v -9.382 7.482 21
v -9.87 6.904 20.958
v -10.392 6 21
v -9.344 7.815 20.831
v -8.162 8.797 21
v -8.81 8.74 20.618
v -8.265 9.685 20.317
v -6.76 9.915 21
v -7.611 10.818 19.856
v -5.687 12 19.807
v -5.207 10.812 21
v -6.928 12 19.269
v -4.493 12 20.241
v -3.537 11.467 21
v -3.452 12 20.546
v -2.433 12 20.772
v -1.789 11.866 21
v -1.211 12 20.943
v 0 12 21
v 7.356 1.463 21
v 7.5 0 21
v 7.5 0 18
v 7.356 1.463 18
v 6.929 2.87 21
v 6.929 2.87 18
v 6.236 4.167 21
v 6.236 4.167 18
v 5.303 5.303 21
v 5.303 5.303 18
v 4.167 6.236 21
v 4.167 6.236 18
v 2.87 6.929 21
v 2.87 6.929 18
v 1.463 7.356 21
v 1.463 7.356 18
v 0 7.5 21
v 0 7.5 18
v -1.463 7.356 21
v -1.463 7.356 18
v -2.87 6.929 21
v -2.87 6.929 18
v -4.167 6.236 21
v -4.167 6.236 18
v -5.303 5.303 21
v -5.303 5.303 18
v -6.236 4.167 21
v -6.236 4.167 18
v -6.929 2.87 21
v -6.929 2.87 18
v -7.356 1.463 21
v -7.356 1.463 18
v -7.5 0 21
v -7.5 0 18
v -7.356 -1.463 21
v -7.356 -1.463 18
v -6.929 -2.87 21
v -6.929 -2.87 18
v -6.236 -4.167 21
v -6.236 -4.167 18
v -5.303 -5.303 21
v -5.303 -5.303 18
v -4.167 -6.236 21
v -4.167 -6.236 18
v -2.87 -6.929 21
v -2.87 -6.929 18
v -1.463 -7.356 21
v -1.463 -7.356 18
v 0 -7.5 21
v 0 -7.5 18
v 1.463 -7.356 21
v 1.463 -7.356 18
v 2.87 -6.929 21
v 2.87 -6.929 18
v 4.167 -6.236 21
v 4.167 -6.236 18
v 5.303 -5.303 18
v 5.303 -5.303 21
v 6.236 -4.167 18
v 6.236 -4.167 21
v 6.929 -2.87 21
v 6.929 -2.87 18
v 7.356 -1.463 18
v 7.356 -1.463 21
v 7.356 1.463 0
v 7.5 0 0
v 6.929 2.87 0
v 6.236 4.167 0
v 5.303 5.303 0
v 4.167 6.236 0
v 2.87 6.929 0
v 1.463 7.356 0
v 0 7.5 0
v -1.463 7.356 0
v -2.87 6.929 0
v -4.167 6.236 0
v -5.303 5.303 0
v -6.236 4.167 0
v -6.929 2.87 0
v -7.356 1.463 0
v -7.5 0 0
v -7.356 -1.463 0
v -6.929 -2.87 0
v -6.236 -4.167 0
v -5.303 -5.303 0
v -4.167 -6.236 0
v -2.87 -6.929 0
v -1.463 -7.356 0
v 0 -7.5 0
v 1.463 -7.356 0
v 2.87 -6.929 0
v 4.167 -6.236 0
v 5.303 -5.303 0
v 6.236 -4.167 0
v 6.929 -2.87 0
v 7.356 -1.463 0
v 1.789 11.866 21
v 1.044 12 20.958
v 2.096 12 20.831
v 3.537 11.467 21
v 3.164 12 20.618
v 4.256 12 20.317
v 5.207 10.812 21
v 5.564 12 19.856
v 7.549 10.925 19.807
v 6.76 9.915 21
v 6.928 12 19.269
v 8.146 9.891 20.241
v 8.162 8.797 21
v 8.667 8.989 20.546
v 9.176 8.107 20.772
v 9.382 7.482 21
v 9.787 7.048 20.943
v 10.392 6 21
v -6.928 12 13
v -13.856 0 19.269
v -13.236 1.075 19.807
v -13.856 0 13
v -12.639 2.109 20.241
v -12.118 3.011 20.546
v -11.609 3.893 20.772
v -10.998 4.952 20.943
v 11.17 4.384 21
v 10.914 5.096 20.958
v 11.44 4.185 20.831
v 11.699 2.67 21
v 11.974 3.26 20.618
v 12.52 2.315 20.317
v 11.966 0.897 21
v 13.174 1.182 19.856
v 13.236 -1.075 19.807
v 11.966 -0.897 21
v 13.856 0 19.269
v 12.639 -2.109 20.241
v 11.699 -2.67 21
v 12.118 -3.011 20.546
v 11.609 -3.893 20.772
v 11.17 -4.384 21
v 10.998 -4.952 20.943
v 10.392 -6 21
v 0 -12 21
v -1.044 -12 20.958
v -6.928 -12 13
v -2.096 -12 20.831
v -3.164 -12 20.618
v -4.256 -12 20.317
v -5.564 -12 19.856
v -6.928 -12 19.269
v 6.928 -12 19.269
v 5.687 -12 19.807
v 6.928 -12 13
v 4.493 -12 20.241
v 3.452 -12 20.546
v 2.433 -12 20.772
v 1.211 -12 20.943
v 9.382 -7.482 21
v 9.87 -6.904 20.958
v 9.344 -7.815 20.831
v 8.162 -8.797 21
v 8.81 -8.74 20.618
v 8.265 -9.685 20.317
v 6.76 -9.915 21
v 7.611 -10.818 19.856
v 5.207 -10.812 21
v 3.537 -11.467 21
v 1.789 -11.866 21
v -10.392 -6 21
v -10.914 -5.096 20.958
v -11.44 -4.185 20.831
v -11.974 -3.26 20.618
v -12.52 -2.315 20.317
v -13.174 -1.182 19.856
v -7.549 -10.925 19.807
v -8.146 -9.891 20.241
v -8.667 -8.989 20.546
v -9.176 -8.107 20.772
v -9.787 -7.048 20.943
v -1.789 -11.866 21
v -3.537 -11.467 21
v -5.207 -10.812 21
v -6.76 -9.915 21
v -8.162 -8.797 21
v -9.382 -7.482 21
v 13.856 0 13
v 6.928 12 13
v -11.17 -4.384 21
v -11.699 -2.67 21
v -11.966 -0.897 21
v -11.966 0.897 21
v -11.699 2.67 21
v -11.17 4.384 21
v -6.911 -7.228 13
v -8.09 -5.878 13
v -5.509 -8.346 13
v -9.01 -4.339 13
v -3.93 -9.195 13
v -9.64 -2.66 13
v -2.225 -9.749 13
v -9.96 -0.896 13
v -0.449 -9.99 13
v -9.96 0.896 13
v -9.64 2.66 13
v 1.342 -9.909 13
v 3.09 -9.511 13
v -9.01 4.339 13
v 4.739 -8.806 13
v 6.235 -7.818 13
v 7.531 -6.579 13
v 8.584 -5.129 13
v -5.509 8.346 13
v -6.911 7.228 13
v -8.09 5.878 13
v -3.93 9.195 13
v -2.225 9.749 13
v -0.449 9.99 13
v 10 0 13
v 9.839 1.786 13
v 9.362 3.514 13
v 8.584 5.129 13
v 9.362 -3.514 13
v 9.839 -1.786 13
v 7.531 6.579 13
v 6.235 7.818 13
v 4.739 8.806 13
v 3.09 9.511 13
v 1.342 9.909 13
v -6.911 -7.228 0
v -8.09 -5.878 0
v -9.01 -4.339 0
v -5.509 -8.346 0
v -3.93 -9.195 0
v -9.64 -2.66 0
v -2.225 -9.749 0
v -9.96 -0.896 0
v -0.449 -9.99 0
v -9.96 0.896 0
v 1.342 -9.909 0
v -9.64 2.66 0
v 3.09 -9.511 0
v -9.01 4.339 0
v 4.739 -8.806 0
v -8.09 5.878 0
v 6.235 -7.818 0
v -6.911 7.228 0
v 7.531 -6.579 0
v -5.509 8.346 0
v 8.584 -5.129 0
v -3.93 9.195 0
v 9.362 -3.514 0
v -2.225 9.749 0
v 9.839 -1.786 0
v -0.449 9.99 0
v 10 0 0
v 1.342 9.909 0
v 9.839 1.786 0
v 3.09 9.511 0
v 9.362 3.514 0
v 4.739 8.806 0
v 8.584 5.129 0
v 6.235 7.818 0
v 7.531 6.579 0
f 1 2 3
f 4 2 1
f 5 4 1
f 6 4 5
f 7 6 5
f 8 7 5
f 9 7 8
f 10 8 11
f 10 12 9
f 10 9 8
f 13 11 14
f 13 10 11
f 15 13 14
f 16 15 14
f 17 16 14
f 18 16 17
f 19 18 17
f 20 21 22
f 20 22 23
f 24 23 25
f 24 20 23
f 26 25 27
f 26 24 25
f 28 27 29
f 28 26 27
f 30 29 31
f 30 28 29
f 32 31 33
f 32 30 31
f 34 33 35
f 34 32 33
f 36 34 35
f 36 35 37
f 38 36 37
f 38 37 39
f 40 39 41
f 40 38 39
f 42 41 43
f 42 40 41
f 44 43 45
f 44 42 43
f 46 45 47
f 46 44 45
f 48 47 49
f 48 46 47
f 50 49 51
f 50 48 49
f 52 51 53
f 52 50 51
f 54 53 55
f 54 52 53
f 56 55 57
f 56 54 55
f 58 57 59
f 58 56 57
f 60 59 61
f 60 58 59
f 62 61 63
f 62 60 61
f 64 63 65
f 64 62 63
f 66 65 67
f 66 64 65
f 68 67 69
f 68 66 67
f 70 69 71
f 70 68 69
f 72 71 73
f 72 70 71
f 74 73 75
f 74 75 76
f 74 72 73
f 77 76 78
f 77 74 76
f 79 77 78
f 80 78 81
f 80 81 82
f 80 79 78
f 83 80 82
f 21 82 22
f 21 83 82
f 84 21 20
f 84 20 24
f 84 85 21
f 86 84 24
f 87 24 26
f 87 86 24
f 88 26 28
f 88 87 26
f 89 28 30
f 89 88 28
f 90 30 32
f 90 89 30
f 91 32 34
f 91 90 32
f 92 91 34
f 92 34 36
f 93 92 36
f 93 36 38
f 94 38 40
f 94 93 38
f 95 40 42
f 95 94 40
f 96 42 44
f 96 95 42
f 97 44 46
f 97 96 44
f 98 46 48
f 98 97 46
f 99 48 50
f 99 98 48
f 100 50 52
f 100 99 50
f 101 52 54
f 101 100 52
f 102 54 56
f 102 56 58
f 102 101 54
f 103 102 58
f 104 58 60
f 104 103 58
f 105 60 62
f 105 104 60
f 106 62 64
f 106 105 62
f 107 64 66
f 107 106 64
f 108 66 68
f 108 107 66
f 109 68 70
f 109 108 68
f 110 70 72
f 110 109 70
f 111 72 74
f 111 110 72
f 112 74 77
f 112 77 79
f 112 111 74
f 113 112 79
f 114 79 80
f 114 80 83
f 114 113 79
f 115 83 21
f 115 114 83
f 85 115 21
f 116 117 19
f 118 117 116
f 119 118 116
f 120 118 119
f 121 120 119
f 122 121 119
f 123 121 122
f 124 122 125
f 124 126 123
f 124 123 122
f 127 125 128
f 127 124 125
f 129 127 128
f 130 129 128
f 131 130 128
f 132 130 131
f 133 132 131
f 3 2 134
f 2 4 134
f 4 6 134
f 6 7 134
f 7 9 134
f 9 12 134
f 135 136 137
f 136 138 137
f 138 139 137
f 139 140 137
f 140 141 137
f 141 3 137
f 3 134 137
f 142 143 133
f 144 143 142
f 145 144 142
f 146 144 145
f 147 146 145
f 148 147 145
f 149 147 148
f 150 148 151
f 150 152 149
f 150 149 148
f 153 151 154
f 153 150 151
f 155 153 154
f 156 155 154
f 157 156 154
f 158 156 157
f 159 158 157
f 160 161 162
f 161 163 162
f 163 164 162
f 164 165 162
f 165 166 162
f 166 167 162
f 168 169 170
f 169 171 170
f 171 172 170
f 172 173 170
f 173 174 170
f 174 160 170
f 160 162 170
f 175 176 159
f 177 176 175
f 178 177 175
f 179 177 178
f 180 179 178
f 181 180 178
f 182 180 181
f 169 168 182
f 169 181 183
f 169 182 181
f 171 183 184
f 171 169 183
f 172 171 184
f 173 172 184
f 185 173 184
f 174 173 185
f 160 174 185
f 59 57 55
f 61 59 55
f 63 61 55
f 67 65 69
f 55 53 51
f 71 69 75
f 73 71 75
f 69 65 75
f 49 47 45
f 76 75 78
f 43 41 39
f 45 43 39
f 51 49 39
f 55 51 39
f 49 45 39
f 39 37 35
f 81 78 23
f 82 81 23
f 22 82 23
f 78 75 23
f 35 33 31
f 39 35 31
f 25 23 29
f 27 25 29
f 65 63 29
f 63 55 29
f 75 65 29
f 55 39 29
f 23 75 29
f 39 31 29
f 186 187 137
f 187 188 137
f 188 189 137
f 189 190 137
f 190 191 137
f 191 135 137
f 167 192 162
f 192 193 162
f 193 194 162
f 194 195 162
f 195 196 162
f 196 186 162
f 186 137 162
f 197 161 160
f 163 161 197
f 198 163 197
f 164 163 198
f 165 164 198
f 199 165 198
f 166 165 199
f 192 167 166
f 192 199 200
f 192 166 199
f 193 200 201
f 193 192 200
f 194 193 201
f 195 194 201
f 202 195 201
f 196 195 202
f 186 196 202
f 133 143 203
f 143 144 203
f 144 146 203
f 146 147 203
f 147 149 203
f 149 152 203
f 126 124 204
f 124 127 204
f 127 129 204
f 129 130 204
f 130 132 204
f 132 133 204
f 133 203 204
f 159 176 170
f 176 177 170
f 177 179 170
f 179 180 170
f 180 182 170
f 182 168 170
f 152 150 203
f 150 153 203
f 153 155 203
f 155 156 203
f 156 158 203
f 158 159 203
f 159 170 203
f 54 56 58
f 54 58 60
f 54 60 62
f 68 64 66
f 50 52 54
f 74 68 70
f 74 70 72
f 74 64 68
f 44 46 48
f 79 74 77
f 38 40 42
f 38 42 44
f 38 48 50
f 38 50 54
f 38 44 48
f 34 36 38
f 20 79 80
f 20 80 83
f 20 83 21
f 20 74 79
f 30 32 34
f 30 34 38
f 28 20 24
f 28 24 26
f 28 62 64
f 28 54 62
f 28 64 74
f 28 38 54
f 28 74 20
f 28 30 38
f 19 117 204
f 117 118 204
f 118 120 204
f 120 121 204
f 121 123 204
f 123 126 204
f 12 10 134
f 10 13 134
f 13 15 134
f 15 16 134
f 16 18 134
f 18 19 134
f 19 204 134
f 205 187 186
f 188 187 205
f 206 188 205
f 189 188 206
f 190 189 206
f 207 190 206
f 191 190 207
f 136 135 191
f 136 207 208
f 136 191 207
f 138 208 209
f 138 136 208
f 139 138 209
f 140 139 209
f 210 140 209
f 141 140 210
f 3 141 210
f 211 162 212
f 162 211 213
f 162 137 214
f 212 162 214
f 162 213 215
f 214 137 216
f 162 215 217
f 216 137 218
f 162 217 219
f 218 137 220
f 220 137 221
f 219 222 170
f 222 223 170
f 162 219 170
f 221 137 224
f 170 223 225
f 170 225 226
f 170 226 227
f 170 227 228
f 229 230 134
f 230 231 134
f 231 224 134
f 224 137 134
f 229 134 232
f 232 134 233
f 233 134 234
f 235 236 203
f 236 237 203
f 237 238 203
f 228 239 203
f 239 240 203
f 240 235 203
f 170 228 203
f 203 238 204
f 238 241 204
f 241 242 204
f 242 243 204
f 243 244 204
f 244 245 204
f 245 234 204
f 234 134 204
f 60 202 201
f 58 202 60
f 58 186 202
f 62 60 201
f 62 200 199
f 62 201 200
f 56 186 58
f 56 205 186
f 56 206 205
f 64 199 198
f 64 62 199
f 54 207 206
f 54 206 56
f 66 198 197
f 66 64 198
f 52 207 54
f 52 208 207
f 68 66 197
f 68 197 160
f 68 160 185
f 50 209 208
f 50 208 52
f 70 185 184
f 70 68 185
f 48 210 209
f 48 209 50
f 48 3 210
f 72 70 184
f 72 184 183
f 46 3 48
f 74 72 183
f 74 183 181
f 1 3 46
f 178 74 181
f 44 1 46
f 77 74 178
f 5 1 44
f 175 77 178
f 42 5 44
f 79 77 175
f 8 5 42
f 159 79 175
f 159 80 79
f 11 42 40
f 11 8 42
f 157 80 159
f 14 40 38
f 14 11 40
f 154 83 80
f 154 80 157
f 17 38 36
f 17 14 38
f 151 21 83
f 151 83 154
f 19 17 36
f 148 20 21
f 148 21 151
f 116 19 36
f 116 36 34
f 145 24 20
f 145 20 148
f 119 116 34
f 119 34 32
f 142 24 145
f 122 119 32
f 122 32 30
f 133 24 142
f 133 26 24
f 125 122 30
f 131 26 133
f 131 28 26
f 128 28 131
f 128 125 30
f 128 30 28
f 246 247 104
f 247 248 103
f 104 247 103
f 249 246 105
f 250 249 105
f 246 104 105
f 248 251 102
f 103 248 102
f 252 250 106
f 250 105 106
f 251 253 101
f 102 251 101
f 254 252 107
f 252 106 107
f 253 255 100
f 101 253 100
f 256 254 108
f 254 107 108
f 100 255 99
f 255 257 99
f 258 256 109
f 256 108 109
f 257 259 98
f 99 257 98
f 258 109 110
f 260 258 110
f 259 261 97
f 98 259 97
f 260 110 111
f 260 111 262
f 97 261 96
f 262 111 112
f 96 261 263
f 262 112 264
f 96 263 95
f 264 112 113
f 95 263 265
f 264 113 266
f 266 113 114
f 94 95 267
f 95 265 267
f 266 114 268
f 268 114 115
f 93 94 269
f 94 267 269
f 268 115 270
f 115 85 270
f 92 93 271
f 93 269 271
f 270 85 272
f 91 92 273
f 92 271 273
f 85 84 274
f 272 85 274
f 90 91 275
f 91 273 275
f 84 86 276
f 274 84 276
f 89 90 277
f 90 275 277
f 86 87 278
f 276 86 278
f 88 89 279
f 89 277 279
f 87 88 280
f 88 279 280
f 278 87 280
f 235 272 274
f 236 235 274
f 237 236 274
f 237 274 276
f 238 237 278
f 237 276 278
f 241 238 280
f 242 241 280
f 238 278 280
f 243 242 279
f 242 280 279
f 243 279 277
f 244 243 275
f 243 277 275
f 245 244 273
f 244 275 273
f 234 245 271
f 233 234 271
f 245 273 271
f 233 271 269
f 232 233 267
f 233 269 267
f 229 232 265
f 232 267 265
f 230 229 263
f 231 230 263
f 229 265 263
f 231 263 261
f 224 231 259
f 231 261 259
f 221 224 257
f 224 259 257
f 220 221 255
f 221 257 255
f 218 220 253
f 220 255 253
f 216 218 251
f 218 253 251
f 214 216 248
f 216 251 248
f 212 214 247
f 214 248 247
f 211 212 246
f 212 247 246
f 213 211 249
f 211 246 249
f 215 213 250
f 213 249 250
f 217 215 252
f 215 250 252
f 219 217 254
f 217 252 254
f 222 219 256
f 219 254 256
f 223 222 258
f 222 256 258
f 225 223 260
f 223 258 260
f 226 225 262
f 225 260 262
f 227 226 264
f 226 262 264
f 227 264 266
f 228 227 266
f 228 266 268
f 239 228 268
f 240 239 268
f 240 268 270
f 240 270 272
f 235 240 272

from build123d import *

# Parameters (mm, degrees)
SCHIZZO1_R                   = 10
SCHIZZO1_R_2                 = 7.5
ESTRUSIONE_ESTRUSIONE1_DEPTH = 13
SCHIZZO2_R                   = 7.5
ESTRUSIONE_ESTRUSIONE2_DEPTH = 8
SCHIZZO3_OUTSIDE_W           = 42.452
SCHIZZO3_OUTSIDE_H           = 38.74
SCHIZZO3_OUTSIDE_R           = 12
TAGLIO_ESTRUSIONE1_DEPTH     = 2
TAGLIO_ESTRUSIONE1_TAPER     = 47
SCHIZZO4_R                   = 7.5
ESTRUSIONE_ESTRUSIONE3_DEPTH = 3


with BuildPart() as part:
    # Schizzo1 → Estrusione-Estrusione1 (new body)
    with BuildSketch(Plane.XY):
        Circle(SCHIZZO1_R)
        Circle(SCHIZZO1_R_2, mode=Mode.SUBTRACT)
    extrude(amount=ESTRUSIONE_ESTRUSIONE1_DEPTH)

    # Schizzo2 → Estrusione-Estrusione2 (add)
    with BuildSketch(Plane.XY.offset(13)):
        Polygon((6.92820323, 12), (-6.92820323, 12), (-13.856406461, 0), (-6.92820323, -12), (6.92820323, -12), (13.856406461, 0), align=None)
        Circle(SCHIZZO2_R, mode=Mode.SUBTRACT)
    extrude(amount=ESTRUSIONE_ESTRUSIONE2_DEPTH)

    # Schizzo3 outside → Taglio-Estrusione1 (cut)
    with BuildSketch(Plane.XY.offset(21)):
        Rectangle(SCHIZZO3_OUTSIDE_W, SCHIZZO3_OUTSIDE_H)
        Circle(SCHIZZO3_OUTSIDE_R, mode=Mode.SUBTRACT)
    extrude(amount=-TAGLIO_ESTRUSIONE1_DEPTH, taper=TAGLIO_ESTRUSIONE1_TAPER, mode=Mode.SUBTRACT)


with BuildPart() as body_2:
    # Schizzo4 → Estrusione-Estrusione3 (new body)
    with BuildSketch(Plane.XY.offset(21)):
        Circle(SCHIZZO4_R)
    extrude(amount=-ESTRUSIONE_ESTRUSIONE3_DEPTH)


solid = Compound([part.part, body_2.part])
